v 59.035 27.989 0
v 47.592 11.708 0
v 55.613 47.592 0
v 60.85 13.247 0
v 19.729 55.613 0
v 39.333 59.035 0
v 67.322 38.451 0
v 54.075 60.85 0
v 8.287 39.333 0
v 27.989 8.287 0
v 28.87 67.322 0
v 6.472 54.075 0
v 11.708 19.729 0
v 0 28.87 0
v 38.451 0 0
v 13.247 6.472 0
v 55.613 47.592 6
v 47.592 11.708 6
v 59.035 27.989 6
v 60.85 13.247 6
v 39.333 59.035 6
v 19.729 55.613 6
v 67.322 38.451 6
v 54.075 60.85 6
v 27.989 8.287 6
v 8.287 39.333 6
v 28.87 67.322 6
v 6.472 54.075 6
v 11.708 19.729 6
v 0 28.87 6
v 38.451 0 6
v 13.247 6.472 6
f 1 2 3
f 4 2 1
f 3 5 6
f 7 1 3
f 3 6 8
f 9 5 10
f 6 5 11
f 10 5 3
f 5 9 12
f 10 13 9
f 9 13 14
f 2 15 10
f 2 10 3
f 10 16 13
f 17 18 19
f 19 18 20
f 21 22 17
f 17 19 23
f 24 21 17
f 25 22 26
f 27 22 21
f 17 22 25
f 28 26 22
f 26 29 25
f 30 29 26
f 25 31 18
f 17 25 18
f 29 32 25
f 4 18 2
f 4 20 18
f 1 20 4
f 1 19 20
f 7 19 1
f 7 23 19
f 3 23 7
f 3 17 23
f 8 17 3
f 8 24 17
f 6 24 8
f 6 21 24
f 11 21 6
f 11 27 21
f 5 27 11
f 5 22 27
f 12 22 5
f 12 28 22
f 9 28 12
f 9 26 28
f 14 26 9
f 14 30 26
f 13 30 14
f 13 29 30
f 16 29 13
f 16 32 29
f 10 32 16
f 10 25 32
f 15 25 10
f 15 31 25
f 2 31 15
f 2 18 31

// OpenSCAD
$fn = 32;

// ----------------------------------------------------------------------
// Chain sprocket: 8 teeth, 26 mm root radius
// ----------------------------------------------------------------------

// --- parameters (mm) ---
profile_height = 6;       // extrusion height
profile_points = 16;      // points of the closed outline

profile = [[59.035, 27.989], [67.322, 38.451], [55.613, 47.592], [54.075, 60.85], [39.333, 59.035], [28.87, 67.322], [19.729, 55.613], [6.472, 54.075], [8.287, 39.333], [0, 28.87], [11.708, 19.729], [13.247, 6.472], [27.989, 8.287], [38.451, 0], [47.592, 11.708], [60.85, 13.247]];  // single closed polygon, 16 points, counter clockwise

// --- the one profile operation ---
linear_extrude(height = profile_height) polygon(points = profile);
